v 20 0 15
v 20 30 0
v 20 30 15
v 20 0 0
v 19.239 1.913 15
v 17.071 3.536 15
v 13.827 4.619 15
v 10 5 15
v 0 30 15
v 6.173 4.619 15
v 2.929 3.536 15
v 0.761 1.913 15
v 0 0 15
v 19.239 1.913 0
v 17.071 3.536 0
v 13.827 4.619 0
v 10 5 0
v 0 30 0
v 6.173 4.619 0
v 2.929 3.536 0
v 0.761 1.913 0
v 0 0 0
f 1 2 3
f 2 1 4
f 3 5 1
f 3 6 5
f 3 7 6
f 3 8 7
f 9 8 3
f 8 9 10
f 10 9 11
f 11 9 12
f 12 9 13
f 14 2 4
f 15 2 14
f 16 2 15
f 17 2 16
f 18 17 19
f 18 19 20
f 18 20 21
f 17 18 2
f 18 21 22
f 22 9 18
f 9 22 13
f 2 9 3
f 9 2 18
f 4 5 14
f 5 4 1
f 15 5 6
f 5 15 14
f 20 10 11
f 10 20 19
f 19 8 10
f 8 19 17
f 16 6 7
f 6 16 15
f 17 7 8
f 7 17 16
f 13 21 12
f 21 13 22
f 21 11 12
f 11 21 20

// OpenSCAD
//projection(){
difference(){
 
cube(
        [
        20,
        30,
        15,
        ]
);
        translate([
010,
000,
000,
])
    scale([2,1,1])
    
    cylinder(r=5,h=20);

}
//}
